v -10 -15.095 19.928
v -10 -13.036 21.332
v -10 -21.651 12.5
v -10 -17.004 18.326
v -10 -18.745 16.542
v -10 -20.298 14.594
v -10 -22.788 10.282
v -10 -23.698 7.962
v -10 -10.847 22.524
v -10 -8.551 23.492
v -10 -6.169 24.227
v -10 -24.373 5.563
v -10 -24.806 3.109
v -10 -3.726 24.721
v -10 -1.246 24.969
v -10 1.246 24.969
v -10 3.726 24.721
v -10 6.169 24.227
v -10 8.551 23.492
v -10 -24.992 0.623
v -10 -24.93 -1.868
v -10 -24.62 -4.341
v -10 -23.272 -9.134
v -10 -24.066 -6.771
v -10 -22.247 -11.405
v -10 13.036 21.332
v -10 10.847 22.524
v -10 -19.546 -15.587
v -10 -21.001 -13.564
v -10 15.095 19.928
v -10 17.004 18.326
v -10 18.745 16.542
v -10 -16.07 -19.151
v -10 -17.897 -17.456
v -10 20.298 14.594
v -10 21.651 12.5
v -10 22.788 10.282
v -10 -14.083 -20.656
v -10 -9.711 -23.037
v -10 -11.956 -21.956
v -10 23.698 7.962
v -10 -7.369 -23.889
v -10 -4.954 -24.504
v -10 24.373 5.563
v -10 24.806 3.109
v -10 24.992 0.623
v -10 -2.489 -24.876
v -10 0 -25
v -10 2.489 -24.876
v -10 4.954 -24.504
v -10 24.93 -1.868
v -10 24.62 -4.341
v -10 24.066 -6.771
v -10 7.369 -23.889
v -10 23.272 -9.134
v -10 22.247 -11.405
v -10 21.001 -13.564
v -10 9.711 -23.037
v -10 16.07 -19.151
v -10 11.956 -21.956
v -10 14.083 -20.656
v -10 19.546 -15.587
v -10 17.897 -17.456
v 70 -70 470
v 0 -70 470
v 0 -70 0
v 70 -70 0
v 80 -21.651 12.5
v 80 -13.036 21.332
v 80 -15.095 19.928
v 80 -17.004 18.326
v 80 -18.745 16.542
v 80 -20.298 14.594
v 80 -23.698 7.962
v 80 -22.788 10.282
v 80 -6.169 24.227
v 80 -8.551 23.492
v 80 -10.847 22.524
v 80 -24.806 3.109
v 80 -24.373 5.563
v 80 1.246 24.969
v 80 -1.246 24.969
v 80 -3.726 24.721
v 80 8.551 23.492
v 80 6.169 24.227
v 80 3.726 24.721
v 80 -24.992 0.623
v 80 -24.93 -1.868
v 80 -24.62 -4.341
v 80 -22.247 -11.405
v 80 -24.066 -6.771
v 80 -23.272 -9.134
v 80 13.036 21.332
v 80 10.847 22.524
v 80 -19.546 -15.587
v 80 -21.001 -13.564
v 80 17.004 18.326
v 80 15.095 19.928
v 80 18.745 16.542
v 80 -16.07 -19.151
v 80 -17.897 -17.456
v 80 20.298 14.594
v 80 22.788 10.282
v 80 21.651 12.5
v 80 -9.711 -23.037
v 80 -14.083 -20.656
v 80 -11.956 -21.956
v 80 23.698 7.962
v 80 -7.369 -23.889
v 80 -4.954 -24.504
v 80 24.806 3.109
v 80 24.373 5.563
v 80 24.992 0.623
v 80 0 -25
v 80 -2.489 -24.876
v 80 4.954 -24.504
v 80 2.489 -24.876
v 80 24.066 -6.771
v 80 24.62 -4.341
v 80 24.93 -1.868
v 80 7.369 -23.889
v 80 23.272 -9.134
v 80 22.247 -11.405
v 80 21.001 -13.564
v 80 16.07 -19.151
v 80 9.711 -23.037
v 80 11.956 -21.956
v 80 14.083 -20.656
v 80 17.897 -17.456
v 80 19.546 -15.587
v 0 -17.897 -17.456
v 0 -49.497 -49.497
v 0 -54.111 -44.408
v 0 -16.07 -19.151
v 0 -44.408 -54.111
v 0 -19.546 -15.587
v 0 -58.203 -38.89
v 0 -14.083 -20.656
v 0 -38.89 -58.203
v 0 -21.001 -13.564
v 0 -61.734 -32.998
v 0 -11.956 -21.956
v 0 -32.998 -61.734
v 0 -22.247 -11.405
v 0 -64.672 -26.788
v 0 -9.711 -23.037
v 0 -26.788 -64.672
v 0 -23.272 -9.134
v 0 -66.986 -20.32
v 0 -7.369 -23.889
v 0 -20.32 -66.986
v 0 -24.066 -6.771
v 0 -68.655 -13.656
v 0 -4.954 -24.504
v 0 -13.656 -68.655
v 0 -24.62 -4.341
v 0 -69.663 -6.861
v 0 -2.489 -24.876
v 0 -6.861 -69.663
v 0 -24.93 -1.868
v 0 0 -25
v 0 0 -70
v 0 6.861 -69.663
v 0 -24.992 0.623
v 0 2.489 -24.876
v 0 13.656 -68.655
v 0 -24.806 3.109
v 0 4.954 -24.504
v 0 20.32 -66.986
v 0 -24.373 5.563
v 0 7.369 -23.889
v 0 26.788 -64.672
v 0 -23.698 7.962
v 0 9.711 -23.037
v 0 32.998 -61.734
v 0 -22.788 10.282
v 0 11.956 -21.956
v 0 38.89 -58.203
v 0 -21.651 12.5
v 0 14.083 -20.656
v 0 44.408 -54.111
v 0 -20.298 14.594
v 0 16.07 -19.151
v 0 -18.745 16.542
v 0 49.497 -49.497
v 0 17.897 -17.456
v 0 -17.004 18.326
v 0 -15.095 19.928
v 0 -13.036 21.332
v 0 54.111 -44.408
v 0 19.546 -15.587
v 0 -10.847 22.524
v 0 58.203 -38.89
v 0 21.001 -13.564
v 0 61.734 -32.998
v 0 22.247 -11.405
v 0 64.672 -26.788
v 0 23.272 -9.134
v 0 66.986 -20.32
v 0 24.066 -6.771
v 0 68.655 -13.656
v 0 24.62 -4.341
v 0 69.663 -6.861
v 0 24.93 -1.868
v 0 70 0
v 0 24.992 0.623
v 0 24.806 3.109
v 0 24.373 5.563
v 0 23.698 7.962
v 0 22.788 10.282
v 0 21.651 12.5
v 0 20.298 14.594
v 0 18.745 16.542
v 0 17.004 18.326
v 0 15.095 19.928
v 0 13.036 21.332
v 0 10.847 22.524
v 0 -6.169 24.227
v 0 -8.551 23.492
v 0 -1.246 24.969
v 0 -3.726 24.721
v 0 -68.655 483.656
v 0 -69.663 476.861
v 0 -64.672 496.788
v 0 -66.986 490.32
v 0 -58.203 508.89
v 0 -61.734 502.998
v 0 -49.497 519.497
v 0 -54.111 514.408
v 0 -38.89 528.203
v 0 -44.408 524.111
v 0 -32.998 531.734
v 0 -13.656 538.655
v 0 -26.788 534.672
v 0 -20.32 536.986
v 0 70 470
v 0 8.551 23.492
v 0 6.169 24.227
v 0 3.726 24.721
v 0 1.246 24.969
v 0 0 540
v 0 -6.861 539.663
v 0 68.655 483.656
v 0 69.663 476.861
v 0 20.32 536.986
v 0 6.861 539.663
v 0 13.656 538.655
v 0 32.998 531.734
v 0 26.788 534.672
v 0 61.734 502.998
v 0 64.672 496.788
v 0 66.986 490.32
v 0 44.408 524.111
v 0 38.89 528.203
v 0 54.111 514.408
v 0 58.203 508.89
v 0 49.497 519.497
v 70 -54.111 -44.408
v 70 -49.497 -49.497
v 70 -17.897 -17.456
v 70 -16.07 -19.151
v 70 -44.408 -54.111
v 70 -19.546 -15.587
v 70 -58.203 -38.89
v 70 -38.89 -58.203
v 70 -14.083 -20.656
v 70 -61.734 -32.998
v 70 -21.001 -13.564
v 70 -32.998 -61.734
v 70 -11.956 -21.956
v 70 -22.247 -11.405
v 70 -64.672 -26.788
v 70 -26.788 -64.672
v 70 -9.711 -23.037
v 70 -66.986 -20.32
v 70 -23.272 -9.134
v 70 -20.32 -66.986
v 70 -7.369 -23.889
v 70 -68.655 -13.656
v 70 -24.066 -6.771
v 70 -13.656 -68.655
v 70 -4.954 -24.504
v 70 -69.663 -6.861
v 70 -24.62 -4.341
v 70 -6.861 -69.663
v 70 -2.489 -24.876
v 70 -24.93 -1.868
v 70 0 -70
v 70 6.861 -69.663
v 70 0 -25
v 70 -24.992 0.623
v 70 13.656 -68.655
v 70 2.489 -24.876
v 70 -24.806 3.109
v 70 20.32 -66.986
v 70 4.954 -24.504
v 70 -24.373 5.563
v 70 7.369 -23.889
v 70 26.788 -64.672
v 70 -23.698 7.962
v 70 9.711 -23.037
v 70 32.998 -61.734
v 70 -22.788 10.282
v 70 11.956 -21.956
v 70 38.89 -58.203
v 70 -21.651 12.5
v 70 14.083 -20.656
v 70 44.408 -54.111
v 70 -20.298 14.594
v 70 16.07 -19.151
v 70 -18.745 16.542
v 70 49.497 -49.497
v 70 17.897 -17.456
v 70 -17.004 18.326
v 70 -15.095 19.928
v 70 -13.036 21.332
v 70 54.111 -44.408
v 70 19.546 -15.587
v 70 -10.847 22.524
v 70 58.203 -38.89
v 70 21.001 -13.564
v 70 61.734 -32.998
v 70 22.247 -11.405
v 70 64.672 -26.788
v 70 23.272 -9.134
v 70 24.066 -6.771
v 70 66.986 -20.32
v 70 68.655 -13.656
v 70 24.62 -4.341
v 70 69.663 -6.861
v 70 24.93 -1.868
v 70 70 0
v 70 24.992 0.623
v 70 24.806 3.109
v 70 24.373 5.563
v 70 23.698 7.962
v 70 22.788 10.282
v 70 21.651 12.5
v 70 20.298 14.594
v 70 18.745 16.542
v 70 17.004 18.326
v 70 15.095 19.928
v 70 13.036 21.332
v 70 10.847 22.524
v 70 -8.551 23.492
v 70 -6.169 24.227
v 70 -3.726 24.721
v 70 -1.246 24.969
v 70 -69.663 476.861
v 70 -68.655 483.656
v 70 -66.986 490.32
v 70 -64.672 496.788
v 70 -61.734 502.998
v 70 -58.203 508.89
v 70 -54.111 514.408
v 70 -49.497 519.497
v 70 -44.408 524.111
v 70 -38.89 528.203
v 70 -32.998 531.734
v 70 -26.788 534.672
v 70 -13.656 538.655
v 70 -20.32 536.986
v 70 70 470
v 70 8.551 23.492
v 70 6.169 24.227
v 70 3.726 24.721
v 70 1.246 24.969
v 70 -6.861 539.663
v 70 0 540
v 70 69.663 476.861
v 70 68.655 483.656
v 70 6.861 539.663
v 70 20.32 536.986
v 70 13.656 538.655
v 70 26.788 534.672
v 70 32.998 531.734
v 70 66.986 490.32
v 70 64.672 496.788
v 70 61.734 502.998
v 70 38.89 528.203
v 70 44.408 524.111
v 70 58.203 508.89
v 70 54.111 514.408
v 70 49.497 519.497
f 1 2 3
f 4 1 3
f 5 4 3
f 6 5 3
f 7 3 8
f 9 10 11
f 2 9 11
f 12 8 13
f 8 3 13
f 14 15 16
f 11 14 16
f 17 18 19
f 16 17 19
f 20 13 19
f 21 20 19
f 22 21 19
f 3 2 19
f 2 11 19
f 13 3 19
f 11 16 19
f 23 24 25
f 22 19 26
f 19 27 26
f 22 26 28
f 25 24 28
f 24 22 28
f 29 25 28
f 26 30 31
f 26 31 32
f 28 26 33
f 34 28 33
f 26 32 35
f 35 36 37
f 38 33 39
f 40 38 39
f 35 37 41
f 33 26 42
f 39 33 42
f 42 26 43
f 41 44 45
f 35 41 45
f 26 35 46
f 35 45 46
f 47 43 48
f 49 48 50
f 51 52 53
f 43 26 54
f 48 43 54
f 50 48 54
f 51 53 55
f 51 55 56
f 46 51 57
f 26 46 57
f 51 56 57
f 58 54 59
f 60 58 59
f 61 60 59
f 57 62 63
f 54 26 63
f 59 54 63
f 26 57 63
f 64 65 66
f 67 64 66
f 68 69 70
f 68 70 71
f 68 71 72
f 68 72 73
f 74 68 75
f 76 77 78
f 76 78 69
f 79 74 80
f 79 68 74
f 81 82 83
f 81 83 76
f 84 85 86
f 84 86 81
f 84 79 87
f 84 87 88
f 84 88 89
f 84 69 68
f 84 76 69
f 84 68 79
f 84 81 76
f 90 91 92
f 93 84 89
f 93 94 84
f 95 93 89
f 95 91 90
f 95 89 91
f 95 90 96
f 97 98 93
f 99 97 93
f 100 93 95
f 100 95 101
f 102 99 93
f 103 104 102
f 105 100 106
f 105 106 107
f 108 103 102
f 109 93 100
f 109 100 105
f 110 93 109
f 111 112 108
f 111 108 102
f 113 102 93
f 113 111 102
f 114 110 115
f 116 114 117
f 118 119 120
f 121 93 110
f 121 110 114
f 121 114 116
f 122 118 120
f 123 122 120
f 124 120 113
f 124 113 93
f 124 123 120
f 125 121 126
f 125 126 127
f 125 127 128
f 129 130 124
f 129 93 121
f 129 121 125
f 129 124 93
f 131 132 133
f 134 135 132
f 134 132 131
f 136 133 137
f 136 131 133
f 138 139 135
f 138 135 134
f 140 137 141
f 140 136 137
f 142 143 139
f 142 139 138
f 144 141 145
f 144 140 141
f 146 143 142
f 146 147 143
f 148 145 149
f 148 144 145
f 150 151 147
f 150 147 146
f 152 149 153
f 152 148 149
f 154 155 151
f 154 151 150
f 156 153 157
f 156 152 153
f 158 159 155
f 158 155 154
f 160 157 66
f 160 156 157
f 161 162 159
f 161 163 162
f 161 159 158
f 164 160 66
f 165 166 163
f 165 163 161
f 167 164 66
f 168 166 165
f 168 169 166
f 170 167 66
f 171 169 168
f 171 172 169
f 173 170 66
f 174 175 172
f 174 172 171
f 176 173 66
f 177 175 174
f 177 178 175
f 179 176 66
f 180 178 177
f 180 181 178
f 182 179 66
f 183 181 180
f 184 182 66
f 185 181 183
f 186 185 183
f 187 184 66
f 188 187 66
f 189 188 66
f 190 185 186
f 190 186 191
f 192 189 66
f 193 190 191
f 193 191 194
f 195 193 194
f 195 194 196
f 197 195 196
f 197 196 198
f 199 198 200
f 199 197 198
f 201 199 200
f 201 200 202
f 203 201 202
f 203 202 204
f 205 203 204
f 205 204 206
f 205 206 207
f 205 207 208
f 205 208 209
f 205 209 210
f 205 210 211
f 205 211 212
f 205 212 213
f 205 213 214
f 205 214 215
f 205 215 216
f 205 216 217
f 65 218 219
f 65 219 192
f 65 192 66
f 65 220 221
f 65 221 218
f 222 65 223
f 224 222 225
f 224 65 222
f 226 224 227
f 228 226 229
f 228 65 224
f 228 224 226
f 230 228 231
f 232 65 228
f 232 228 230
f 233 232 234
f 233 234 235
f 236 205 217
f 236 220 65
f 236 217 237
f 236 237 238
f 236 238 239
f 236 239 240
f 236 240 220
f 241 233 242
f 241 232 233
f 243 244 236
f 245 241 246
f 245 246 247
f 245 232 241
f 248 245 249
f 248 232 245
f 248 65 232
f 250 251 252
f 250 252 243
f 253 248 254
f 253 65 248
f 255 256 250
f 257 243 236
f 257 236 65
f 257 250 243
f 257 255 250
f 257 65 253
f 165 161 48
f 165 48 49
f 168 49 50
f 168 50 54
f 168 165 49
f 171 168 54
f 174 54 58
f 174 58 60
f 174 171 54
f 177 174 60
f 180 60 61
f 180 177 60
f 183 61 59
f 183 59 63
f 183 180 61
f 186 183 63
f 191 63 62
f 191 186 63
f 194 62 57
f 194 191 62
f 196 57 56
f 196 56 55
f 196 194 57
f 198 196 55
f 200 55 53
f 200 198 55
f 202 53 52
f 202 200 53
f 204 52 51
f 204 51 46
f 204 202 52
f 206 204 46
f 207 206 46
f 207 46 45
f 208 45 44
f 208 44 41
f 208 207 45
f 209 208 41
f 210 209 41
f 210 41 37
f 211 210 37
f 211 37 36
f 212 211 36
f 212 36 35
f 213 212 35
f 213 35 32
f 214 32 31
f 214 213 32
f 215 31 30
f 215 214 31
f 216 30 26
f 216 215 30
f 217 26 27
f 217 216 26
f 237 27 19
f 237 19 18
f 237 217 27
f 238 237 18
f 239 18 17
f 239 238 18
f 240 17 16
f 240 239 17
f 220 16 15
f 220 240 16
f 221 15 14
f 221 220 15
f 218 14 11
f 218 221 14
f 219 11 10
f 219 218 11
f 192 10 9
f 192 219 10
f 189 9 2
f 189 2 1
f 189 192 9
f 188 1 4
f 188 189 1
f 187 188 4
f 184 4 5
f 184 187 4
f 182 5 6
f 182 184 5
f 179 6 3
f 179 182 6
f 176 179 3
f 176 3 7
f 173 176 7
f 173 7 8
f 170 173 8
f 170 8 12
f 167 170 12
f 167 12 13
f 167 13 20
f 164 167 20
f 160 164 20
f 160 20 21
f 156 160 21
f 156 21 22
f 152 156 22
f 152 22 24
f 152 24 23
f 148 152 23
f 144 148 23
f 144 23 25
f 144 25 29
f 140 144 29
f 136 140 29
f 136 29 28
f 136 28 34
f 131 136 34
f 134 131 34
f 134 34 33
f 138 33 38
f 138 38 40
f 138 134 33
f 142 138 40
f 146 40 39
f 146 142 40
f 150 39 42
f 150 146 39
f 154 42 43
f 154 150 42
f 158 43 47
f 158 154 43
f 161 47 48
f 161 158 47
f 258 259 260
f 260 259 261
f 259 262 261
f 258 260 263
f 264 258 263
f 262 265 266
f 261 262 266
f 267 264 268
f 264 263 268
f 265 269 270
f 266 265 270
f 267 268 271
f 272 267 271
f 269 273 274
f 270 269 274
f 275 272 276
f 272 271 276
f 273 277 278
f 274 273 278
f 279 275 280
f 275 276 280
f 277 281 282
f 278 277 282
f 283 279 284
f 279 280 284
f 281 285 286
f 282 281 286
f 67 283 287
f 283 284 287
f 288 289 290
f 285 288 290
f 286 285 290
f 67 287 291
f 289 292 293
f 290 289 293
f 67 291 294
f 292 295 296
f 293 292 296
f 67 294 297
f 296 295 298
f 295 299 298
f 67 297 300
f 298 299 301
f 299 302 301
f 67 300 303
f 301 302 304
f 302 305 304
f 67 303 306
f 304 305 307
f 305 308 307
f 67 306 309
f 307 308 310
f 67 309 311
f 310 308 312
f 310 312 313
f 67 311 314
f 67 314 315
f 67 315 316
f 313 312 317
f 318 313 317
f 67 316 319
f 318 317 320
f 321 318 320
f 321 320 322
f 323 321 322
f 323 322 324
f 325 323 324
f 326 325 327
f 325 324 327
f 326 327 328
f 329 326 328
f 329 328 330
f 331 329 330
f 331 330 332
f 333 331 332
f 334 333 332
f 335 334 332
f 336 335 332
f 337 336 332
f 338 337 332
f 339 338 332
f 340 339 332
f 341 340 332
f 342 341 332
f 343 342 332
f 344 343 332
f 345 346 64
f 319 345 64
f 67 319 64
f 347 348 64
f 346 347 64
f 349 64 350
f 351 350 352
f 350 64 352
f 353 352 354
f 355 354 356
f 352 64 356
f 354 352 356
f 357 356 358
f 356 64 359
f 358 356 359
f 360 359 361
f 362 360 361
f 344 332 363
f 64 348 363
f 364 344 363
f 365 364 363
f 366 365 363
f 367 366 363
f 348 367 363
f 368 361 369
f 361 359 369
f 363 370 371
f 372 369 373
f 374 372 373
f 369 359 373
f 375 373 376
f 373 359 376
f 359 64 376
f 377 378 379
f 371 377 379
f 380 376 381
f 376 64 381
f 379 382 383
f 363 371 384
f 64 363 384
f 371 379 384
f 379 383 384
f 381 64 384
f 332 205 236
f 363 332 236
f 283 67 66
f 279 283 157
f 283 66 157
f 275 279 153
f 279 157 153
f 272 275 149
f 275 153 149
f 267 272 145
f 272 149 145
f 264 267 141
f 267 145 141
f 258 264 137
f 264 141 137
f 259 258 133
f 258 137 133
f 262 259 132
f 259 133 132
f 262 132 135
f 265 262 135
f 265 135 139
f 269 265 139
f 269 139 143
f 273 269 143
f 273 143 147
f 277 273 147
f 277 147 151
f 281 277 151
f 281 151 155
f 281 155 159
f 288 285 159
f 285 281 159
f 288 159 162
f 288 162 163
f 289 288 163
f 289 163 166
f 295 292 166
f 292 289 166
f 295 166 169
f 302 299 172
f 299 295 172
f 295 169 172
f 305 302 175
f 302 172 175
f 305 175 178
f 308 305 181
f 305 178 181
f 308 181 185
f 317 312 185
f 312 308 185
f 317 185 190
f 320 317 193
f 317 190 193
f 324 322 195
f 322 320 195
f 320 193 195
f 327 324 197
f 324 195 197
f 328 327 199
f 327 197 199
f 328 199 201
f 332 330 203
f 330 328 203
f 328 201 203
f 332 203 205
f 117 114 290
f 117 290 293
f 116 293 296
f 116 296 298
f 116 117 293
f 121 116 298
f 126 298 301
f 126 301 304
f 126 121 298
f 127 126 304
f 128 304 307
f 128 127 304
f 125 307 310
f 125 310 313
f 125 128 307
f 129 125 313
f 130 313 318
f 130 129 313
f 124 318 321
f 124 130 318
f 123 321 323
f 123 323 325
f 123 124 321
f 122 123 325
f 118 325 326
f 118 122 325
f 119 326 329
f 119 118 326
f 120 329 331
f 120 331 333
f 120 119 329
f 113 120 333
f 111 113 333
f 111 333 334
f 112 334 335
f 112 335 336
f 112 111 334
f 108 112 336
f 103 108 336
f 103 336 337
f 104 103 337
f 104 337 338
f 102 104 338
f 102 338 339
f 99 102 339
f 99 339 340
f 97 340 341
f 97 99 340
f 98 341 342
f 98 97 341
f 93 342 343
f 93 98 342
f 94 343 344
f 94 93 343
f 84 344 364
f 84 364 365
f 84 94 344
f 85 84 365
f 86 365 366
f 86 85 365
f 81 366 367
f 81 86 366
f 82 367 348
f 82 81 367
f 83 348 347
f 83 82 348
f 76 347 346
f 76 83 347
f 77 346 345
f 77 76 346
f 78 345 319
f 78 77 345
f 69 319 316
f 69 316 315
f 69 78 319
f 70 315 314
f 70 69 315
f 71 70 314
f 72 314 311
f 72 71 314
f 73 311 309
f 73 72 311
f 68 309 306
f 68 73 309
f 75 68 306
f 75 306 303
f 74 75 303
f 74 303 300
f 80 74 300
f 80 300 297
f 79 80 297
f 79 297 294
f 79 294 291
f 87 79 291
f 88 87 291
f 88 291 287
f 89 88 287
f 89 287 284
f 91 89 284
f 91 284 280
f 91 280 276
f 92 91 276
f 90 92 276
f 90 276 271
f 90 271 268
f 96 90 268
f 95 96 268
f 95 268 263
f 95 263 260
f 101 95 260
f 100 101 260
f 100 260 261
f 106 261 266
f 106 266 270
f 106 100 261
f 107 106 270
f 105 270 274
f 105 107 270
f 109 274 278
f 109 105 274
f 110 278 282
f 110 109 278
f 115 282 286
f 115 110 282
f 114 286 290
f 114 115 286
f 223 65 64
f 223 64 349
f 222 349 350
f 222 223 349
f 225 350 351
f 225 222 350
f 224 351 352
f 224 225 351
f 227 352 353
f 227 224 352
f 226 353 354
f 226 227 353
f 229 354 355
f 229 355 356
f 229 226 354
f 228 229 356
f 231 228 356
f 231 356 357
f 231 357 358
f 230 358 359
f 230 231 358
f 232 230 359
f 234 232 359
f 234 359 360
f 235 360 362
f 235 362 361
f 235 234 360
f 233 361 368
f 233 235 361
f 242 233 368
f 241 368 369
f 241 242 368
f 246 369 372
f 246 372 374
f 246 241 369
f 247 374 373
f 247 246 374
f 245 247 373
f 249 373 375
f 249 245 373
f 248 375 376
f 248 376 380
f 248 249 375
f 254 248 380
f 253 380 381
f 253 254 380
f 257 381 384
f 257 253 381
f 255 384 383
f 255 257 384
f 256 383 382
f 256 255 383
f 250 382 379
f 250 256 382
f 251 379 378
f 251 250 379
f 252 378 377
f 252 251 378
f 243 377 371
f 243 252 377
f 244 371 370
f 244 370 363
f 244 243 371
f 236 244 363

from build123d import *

# Parameters (mm, degrees)
SKETCH3_R           = 70
BOSS_EXTRUDE1_DEPTH = 70
SKETCH4_R           = 25
BOSS_EXTRUDE2_DEPTH = 10
BOSS_EXTRUDE3_START = 10
SKETCH6_R           = 25
BOSS_EXTRUDE3_DEPTH = 10
SKETCH7_W           = 70
SKETCH7_H           = 400
BOSS_EXTRUDE4_DEPTH = 140
BOSS_EXTRUDE5_START = -70
BOSS_EXTRUDE5_DEPTH = 70
BOSS_EXTRUDE6_DEPTH = 70


with BuildPart() as part:
    # Sketch3 → Boss-Extrude1 (new body)
    with BuildSketch(Plane(origin=(0, 0, 0), x_dir=(0, 0, -1), z_dir=(1, 0, 0))):
        Circle(SKETCH3_R)
    extrude(amount=BOSS_EXTRUDE1_DEPTH)

    # Sketch4 → Boss-Extrude2 (add)
    with BuildSketch(Plane(origin=(0, 0, 0), x_dir=(0, 0, -1), z_dir=(1, 0, 0))):
        Circle(SKETCH4_R)
    extrude(amount=-BOSS_EXTRUDE2_DEPTH)

    # Sketch6 → Boss-Extrude3 (add)
    with BuildSketch(Plane(origin=(70, 0, 0), x_dir=(0, 0, -1), z_dir=(1, 0, 0)).offset(BOSS_EXTRUDE3_START)):
        Circle(SKETCH6_R)
    extrude(amount=-BOSS_EXTRUDE3_DEPTH)



with BuildPart() as body_2:
    # Sketch7 → Boss-Extrude4 (new body)
    with BuildSketch(Plane(origin=(0, 70, 0), x_dir=(1, 0, 0), z_dir=(0, 1, 0))):
        with Locations((35, -270)):
            Rectangle(SKETCH7_W, SKETCH7_H)
    extrude(amount=-BOSS_EXTRUDE4_DEPTH)


with BuildPart() as part_1:
    add(part.part)

    add(body_2.part)  # Boss-Extrude5 merges body 2
    # Sketch8 → Boss-Extrude5 (add)
    with BuildSketch(Plane(origin=(70, 0, 0), x_dir=(0, 0, -1), z_dir=(1, 0, 0)).offset(BOSS_EXTRUDE5_START)):
        with BuildLine():
            ThreePointArc((-70, -2.7e-08), (-49.497474693, 49.497474674), (0, 70))
            Line((0, 70), (-70, 70))
            Line((-70, 70), (-70, -2.7e-08))
        make_face()
        with BuildLine():
            ThreePointArc((0, -70), (-49.497474674, -49.497474693), (-70, -2.7e-08))
            Line((-70, -2.7e-08), (-70, -70))
            Line((-70, -70), (0, -70))
        make_face()
    extrude(amount=BOSS_EXTRUDE5_DEPTH)

    # Sketch9 → Boss-Extrude6 (add)
    with BuildSketch(Plane(origin=(0, 0, 0), x_dir=(0, 0, -1), z_dir=(1, 0, 0))):
        with BuildLine():
            Line((-470, 70), (-470, -70))
            ThreePointArc((-470, -70), (-540, 0), (-470, 70))
        make_face()
    extrude(amount=BOSS_EXTRUDE6_DEPTH)


solid = part_1.part
